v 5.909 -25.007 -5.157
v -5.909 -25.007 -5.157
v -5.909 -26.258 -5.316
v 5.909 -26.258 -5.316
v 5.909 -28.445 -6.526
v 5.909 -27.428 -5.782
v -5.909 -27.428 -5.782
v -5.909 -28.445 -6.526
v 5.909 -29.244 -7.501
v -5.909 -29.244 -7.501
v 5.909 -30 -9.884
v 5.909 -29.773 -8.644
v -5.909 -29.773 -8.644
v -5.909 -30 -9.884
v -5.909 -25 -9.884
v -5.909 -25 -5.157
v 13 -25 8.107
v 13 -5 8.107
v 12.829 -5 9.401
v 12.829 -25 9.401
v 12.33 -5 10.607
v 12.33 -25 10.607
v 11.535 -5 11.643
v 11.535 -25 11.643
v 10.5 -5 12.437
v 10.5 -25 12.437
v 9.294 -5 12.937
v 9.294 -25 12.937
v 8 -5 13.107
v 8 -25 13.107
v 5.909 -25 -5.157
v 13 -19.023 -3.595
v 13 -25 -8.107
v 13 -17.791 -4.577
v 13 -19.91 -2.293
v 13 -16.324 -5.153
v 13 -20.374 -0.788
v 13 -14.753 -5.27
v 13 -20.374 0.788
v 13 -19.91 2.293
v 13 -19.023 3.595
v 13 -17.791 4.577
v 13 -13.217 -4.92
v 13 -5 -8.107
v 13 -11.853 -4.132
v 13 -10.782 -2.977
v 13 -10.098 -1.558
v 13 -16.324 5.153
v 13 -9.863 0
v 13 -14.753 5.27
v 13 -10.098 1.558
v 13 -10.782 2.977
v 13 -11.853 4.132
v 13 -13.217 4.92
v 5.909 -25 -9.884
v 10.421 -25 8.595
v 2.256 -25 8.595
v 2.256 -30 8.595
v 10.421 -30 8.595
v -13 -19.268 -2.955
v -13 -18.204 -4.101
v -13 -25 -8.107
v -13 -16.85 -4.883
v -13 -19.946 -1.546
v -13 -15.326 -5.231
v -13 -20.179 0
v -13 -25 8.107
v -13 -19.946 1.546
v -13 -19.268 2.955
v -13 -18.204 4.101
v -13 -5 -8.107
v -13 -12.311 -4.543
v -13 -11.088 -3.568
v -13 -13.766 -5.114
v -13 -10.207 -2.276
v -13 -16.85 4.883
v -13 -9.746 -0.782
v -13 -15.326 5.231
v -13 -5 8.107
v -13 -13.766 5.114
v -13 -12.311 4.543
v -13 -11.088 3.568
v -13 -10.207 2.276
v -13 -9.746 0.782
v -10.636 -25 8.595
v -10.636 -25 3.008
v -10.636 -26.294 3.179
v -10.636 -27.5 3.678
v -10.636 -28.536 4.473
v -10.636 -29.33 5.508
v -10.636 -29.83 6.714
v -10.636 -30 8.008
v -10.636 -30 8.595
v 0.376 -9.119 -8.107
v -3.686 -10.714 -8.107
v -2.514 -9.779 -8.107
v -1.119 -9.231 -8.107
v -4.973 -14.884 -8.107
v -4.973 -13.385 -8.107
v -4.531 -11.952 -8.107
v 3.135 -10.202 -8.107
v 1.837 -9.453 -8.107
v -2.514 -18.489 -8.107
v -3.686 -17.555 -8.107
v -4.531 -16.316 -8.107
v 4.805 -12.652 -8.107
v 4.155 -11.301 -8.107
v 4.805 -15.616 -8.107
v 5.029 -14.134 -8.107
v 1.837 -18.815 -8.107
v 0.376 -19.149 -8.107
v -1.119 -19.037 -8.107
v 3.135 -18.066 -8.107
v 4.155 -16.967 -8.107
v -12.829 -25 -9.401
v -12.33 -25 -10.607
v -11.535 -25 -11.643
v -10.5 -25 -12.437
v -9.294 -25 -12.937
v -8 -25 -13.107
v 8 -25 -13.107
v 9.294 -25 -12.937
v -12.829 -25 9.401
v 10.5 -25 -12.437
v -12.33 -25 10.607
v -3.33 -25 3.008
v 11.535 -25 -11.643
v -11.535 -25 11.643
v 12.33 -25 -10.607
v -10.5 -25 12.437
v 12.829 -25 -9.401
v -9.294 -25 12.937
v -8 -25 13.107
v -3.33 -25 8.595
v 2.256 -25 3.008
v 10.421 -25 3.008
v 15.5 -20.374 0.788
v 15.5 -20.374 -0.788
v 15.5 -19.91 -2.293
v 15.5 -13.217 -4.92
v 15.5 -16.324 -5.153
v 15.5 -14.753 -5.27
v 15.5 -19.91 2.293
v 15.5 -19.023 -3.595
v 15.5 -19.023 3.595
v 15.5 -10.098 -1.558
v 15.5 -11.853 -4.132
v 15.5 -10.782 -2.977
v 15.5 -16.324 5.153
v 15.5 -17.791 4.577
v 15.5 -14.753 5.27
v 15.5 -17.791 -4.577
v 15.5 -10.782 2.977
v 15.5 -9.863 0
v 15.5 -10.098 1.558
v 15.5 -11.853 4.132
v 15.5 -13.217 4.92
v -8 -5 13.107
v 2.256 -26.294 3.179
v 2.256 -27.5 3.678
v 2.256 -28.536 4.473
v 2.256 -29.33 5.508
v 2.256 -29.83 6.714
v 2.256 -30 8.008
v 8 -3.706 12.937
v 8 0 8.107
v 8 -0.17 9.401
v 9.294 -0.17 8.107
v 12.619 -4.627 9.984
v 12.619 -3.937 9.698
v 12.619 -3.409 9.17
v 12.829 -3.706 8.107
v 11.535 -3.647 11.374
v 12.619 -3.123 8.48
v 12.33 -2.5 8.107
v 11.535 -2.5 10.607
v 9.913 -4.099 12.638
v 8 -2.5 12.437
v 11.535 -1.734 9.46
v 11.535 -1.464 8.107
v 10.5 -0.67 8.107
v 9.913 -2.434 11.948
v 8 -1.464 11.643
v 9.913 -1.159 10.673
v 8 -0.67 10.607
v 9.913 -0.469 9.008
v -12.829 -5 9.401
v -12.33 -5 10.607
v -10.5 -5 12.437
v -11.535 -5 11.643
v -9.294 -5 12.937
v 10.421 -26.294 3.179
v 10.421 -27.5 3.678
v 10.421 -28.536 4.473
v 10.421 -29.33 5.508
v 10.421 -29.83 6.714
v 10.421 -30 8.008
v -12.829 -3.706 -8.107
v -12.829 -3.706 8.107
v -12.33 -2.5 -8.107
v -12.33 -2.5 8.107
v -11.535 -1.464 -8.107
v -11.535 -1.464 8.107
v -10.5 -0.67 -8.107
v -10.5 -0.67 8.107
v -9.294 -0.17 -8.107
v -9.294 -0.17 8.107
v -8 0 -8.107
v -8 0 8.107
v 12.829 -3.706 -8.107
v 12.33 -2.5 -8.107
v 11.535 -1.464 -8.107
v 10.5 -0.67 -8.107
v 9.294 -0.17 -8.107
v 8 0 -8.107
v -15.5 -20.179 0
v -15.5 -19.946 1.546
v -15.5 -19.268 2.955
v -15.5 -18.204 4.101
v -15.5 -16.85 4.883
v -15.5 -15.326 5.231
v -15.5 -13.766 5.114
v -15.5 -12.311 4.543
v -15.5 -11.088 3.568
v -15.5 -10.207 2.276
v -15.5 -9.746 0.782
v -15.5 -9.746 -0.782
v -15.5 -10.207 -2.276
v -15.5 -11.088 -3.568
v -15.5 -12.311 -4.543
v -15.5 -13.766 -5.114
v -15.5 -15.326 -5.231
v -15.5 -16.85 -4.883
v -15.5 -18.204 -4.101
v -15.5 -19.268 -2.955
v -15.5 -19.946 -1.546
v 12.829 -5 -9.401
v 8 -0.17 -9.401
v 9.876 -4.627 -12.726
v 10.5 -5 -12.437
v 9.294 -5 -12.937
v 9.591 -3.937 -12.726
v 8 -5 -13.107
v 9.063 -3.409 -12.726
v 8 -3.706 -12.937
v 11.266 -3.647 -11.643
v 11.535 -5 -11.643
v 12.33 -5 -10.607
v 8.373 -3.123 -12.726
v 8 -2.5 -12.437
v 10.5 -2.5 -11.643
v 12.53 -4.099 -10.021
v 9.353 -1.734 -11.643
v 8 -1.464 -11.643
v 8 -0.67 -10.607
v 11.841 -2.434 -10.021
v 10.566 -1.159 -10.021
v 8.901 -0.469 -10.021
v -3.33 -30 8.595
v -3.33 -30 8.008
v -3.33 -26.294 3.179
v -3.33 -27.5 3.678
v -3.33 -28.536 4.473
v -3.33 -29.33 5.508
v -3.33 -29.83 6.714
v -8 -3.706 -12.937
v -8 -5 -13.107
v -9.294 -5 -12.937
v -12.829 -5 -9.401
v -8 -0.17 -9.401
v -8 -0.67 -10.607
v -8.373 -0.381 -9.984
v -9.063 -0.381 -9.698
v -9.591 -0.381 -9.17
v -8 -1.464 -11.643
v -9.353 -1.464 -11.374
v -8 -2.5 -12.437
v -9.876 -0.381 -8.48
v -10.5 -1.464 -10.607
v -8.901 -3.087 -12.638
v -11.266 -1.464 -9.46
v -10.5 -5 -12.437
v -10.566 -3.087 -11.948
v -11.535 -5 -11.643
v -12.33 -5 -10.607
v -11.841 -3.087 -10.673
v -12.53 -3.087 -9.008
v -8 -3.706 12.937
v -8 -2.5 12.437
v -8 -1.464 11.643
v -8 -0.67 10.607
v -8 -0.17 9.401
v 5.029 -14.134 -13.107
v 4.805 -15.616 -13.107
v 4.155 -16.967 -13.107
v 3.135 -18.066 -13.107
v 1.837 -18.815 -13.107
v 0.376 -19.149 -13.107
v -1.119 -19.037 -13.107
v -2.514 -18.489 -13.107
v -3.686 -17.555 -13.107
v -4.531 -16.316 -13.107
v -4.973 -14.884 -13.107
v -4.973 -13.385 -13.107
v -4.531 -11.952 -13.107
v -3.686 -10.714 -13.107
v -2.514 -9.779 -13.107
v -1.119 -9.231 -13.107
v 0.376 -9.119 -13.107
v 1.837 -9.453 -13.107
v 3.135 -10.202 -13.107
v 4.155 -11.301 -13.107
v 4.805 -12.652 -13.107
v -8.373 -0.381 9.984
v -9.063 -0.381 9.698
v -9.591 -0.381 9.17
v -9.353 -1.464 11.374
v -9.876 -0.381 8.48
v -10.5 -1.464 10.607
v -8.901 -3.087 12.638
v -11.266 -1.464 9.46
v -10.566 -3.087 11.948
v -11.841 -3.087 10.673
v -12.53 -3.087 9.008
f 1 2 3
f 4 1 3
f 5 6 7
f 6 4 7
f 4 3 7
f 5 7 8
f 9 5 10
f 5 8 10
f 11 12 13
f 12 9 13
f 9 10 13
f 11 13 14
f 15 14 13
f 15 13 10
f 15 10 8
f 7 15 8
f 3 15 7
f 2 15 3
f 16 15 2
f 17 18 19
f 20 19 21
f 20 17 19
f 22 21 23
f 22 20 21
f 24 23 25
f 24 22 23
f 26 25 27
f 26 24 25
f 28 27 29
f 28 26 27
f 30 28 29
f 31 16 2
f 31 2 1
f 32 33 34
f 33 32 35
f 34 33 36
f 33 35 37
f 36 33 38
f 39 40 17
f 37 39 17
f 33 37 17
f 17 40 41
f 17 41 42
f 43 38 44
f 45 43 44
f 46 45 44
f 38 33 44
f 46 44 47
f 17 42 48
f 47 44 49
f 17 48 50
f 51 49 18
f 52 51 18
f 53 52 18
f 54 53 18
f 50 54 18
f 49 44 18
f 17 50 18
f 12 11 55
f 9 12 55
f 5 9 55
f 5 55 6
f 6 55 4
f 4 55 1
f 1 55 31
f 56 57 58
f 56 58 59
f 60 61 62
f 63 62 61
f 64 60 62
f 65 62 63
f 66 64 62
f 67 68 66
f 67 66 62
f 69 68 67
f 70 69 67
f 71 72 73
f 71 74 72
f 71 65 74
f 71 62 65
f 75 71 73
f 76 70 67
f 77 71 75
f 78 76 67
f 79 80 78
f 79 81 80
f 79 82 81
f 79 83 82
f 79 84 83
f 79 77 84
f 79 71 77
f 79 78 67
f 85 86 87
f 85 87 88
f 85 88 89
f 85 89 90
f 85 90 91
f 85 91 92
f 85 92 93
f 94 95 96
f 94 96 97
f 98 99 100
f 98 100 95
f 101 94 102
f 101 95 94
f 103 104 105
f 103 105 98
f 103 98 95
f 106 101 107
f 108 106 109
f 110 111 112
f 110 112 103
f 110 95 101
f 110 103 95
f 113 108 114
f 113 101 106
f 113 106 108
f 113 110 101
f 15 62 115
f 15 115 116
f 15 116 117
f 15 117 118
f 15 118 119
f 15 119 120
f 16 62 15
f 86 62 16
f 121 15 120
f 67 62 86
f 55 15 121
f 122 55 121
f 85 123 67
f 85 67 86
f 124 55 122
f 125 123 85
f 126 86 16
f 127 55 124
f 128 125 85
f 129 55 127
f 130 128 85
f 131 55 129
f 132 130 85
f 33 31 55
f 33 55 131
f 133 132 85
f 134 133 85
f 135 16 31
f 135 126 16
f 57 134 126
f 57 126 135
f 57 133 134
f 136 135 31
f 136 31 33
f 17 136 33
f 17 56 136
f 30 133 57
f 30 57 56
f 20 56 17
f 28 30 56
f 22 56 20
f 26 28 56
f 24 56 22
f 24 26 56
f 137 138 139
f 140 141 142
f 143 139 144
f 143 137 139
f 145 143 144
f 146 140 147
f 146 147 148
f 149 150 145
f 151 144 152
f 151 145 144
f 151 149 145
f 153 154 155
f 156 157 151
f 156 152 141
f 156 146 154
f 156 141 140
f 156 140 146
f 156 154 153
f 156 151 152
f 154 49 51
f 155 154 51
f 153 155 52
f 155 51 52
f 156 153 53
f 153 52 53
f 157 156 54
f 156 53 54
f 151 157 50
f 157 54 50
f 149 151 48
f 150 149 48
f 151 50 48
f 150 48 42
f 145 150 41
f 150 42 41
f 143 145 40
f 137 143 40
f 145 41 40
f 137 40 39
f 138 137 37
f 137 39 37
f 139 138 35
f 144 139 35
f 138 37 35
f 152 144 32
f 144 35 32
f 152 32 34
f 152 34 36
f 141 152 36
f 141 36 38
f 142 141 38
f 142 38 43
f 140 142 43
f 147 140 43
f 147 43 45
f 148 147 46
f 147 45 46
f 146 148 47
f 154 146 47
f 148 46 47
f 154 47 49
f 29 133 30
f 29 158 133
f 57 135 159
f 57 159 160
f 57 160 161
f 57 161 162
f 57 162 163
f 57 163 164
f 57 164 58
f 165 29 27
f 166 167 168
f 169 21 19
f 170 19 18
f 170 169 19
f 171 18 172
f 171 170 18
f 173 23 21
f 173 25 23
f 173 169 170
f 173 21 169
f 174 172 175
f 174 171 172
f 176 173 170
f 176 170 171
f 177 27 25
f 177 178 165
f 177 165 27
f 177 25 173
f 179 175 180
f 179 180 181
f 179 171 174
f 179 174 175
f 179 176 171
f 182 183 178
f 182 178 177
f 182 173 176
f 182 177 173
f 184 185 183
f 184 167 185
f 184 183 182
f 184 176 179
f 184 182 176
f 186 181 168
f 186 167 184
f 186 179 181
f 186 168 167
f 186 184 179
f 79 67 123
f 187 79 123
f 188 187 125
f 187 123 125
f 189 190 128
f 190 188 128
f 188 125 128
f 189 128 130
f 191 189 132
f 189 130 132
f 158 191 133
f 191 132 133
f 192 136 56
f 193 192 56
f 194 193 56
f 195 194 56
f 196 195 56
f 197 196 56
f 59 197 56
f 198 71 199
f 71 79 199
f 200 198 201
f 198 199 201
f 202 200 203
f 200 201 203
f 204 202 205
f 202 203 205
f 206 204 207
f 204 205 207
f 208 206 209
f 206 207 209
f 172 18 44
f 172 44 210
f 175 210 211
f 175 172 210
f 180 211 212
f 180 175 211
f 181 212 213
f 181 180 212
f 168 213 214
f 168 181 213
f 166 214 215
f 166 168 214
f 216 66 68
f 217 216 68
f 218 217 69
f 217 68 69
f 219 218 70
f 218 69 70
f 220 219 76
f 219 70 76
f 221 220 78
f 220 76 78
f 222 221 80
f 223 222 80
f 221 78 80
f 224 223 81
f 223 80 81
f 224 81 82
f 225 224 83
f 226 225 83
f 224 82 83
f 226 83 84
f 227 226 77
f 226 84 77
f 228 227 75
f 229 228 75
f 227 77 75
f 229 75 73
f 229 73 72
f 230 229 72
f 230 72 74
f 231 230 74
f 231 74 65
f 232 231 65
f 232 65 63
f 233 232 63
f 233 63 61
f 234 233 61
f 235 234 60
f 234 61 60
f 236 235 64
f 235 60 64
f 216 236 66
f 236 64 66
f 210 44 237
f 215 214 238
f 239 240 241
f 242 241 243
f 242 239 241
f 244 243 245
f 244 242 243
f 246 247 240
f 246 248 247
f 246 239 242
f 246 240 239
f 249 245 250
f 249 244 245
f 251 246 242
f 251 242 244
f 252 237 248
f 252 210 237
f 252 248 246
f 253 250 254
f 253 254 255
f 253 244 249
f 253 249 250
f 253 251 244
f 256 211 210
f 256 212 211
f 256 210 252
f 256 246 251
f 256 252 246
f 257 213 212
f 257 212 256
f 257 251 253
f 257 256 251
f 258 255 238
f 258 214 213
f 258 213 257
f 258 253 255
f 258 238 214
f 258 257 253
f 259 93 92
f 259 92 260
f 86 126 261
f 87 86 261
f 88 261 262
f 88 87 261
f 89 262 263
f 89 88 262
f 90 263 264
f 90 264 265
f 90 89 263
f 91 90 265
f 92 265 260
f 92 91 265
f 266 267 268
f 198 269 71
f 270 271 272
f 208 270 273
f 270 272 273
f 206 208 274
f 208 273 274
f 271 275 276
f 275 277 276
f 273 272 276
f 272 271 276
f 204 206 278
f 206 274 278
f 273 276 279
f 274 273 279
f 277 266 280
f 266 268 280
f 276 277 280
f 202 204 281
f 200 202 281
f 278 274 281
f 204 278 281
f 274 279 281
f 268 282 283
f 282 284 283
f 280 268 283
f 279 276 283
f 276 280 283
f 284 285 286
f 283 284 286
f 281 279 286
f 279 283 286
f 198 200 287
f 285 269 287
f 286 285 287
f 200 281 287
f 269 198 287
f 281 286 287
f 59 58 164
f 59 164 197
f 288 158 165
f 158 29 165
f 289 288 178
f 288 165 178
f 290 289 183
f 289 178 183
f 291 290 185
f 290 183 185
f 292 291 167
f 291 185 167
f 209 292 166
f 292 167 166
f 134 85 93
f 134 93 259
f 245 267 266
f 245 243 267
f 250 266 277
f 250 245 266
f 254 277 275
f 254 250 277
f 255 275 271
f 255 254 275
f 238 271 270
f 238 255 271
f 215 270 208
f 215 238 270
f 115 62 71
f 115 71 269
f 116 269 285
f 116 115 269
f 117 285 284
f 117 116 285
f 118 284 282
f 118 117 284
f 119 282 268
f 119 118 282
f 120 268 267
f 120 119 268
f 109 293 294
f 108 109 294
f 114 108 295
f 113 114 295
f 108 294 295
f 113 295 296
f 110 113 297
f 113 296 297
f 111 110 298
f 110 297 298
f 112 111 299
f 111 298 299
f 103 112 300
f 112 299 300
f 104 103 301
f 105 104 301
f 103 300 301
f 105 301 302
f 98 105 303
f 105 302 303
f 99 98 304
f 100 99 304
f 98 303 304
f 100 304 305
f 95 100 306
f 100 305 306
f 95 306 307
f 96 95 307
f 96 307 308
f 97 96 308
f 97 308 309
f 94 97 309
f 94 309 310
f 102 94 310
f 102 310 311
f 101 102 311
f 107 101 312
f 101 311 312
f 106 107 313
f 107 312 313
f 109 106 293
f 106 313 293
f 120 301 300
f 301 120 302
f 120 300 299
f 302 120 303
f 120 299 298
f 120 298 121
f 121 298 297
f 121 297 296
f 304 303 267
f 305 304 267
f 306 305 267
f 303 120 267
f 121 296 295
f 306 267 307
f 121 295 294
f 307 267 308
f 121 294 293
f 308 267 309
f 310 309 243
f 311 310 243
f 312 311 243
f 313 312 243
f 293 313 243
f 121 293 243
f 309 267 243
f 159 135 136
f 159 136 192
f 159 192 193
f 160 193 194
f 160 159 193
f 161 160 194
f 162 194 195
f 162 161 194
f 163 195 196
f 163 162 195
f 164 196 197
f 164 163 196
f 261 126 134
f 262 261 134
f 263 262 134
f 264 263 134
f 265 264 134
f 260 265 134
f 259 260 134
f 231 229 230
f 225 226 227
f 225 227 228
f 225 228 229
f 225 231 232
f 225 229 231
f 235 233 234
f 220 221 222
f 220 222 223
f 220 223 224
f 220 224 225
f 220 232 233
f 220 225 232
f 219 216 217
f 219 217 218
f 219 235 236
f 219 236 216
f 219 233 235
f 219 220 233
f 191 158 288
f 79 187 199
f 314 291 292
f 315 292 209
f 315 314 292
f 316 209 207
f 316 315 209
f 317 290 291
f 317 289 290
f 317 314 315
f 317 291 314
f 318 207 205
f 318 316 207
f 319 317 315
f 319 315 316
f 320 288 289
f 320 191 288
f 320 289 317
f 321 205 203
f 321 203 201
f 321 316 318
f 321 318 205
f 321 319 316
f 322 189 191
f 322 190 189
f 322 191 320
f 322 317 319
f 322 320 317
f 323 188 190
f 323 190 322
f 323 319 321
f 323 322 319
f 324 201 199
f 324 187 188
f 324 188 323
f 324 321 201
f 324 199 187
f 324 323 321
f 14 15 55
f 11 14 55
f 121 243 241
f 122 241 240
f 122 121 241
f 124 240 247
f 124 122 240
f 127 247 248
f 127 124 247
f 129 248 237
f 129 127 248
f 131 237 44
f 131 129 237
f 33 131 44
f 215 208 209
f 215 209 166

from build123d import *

# Parameters (mm, degrees)
F0_W        = 25.9993169457
F0_H        = 26.2141898274
F1_DEPTH    = 25
F2_R        = 5
F3_W        = 8.165073581
F3_H        = 5.5866301991
F3_W_2      = 7.3055946268
F4_W        = 11.8178697303
F4_H        = 4.7271503136
F5_DEPTH    = 5
F6_T1_DEPTH = 32.3055946268
F6_T3_DEPTH = 33.165073581
F6_T5_DEPTH = 36.7806185015
F7_R        = 5.2851135751
F9_DEPTH    = 2.5
F8_R        = 5.2456555176
F10_DEPTH   = 2.5
F11_R       = 5.0288488875
F12_DEPTH   = 5


# Not quite as in the source:
# - a fillet or chamfer that OpenCascade refuses, or shapes differently, is made with other operations: its cross-section is extruded or revolved along the edge and cut away or added


with BuildPart() as f1:
    # F0 (on Front) → F1 (new body)
    with BuildSketch(Plane.XZ):
        Rectangle(F0_W, F0_H)
    extrude(amount=F1_DEPTH)

    # F2
    f2_edges = [f1.edges().sort_by_distance(p)[0] for p in [
        (-12.999658, -12.5, 13.107095),
        (0, 0, 13.107095),
        (12.999658, -12.5, 13.107095),
        (12.999658, 0, 0),
        (12.999658, -12.5, -13.107095),
        (-12.999658, -12.5, -13.107095),
        (0, 0, -13.107095),
        (-12.999658, 0, 0),
    ]]
    fillet(f2_edges, radius=F2_R)

    # F3 (on face) + F4 (on face) → F5 (join)
    with BuildSketch(Plane.XZ.offset(25)):
        with Locations((6.3386769034, 5.8015007526)):
            Rectangle(F3_W, F3_H)
        with Locations((-6.9832885638, 5.8015007526)):
            Rectangle(F3_W_2, F3_H)
    with BuildSketch(Plane.XZ.offset(25)):
        with Locations((0, -7.5204637833)):
            Rectangle(F4_W, F4_H)
    extrude(amount=F5_DEPTH)

    # F6: fillet of radius 5 on 3 edges, made by hand

    # F6_s2 → F6_t1 (cut)
    with BuildSketch(Plane.YZ.offset(-23.1360858772)):
        with BuildLine():
            ThreePointArc((-25, 3.008185653), (-28.5355339059, 4.4726517471), (-30, 8.008185653))
            Line((-30, 8.008185653), (-30, 3.008185653))
            Line((-30, 3.008185653), (-25, 3.008185653))
        make_face()
    extrude(amount=F6_T1_DEPTH, mode=Mode.SUBTRACT)

    # F6_s4 → F6_t3 (cut)
    with BuildSketch(Plane.YZ.offset(-10.2438598871)):
        with BuildLine():
            ThreePointArc((-25, 3.008185653), (-28.5355339059, 4.4726517471), (-30, 8.008185653))
            Line((-30, 8.008185653), (-30, 3.008185653))
            Line((-30, 3.008185653), (-25, 3.008185653))
        make_face()
    extrude(amount=F6_T3_DEPTH, mode=Mode.SUBTRACT)

    # F6_s6 → F6_t5 (cut)
    with BuildSketch(Plane.YZ.offset(-18.3903092508)):
        with BuildLine():
            ThreePointArc((-25.0074502458, -5.1568886265), (-28.4451639895, -6.5261691088), (-30, -9.8840389401))
            Line((-30, -9.8840389401), (-30, -5.1568886265))
            Line((-30, -5.1568886265), (-25.0074502458, -5.1568886265))
        make_face()
    extrude(amount=F6_T5_DEPTH, mode=Mode.SUBTRACT)

    # F7 (on face) → F9 (join)
    with BuildSketch(Plane.YZ.offset(12.9996584728)):
        with Locations((-15.1483640075, 0)):
            Circle(F7_R)
    extrude(amount=F9_DEPTH)

    # F8 (on face) → F10 (join)
    with BuildSketch(Plane(origin=(-12.9996584728, 0, 0), x_dir=(0, -1, 0), z_dir=(-1, 0, 0))):
        with Locations((14.9334929883, 0)):
            Circle(F8_R)
    extrude(amount=F10_DEPTH)

    # F11 (on face) → F12 (cut)
    with BuildSketch(Plane(origin=(0, 0, -13.1070949137), x_dir=(1, 0, 0), z_dir=(0, 0, -1))):
        with Locations((0, 14.1341807321)):
            Circle(F11_R)
    extrude(amount=-F12_DEPTH, mode=Mode.SUBTRACT)


solid = f1.part
